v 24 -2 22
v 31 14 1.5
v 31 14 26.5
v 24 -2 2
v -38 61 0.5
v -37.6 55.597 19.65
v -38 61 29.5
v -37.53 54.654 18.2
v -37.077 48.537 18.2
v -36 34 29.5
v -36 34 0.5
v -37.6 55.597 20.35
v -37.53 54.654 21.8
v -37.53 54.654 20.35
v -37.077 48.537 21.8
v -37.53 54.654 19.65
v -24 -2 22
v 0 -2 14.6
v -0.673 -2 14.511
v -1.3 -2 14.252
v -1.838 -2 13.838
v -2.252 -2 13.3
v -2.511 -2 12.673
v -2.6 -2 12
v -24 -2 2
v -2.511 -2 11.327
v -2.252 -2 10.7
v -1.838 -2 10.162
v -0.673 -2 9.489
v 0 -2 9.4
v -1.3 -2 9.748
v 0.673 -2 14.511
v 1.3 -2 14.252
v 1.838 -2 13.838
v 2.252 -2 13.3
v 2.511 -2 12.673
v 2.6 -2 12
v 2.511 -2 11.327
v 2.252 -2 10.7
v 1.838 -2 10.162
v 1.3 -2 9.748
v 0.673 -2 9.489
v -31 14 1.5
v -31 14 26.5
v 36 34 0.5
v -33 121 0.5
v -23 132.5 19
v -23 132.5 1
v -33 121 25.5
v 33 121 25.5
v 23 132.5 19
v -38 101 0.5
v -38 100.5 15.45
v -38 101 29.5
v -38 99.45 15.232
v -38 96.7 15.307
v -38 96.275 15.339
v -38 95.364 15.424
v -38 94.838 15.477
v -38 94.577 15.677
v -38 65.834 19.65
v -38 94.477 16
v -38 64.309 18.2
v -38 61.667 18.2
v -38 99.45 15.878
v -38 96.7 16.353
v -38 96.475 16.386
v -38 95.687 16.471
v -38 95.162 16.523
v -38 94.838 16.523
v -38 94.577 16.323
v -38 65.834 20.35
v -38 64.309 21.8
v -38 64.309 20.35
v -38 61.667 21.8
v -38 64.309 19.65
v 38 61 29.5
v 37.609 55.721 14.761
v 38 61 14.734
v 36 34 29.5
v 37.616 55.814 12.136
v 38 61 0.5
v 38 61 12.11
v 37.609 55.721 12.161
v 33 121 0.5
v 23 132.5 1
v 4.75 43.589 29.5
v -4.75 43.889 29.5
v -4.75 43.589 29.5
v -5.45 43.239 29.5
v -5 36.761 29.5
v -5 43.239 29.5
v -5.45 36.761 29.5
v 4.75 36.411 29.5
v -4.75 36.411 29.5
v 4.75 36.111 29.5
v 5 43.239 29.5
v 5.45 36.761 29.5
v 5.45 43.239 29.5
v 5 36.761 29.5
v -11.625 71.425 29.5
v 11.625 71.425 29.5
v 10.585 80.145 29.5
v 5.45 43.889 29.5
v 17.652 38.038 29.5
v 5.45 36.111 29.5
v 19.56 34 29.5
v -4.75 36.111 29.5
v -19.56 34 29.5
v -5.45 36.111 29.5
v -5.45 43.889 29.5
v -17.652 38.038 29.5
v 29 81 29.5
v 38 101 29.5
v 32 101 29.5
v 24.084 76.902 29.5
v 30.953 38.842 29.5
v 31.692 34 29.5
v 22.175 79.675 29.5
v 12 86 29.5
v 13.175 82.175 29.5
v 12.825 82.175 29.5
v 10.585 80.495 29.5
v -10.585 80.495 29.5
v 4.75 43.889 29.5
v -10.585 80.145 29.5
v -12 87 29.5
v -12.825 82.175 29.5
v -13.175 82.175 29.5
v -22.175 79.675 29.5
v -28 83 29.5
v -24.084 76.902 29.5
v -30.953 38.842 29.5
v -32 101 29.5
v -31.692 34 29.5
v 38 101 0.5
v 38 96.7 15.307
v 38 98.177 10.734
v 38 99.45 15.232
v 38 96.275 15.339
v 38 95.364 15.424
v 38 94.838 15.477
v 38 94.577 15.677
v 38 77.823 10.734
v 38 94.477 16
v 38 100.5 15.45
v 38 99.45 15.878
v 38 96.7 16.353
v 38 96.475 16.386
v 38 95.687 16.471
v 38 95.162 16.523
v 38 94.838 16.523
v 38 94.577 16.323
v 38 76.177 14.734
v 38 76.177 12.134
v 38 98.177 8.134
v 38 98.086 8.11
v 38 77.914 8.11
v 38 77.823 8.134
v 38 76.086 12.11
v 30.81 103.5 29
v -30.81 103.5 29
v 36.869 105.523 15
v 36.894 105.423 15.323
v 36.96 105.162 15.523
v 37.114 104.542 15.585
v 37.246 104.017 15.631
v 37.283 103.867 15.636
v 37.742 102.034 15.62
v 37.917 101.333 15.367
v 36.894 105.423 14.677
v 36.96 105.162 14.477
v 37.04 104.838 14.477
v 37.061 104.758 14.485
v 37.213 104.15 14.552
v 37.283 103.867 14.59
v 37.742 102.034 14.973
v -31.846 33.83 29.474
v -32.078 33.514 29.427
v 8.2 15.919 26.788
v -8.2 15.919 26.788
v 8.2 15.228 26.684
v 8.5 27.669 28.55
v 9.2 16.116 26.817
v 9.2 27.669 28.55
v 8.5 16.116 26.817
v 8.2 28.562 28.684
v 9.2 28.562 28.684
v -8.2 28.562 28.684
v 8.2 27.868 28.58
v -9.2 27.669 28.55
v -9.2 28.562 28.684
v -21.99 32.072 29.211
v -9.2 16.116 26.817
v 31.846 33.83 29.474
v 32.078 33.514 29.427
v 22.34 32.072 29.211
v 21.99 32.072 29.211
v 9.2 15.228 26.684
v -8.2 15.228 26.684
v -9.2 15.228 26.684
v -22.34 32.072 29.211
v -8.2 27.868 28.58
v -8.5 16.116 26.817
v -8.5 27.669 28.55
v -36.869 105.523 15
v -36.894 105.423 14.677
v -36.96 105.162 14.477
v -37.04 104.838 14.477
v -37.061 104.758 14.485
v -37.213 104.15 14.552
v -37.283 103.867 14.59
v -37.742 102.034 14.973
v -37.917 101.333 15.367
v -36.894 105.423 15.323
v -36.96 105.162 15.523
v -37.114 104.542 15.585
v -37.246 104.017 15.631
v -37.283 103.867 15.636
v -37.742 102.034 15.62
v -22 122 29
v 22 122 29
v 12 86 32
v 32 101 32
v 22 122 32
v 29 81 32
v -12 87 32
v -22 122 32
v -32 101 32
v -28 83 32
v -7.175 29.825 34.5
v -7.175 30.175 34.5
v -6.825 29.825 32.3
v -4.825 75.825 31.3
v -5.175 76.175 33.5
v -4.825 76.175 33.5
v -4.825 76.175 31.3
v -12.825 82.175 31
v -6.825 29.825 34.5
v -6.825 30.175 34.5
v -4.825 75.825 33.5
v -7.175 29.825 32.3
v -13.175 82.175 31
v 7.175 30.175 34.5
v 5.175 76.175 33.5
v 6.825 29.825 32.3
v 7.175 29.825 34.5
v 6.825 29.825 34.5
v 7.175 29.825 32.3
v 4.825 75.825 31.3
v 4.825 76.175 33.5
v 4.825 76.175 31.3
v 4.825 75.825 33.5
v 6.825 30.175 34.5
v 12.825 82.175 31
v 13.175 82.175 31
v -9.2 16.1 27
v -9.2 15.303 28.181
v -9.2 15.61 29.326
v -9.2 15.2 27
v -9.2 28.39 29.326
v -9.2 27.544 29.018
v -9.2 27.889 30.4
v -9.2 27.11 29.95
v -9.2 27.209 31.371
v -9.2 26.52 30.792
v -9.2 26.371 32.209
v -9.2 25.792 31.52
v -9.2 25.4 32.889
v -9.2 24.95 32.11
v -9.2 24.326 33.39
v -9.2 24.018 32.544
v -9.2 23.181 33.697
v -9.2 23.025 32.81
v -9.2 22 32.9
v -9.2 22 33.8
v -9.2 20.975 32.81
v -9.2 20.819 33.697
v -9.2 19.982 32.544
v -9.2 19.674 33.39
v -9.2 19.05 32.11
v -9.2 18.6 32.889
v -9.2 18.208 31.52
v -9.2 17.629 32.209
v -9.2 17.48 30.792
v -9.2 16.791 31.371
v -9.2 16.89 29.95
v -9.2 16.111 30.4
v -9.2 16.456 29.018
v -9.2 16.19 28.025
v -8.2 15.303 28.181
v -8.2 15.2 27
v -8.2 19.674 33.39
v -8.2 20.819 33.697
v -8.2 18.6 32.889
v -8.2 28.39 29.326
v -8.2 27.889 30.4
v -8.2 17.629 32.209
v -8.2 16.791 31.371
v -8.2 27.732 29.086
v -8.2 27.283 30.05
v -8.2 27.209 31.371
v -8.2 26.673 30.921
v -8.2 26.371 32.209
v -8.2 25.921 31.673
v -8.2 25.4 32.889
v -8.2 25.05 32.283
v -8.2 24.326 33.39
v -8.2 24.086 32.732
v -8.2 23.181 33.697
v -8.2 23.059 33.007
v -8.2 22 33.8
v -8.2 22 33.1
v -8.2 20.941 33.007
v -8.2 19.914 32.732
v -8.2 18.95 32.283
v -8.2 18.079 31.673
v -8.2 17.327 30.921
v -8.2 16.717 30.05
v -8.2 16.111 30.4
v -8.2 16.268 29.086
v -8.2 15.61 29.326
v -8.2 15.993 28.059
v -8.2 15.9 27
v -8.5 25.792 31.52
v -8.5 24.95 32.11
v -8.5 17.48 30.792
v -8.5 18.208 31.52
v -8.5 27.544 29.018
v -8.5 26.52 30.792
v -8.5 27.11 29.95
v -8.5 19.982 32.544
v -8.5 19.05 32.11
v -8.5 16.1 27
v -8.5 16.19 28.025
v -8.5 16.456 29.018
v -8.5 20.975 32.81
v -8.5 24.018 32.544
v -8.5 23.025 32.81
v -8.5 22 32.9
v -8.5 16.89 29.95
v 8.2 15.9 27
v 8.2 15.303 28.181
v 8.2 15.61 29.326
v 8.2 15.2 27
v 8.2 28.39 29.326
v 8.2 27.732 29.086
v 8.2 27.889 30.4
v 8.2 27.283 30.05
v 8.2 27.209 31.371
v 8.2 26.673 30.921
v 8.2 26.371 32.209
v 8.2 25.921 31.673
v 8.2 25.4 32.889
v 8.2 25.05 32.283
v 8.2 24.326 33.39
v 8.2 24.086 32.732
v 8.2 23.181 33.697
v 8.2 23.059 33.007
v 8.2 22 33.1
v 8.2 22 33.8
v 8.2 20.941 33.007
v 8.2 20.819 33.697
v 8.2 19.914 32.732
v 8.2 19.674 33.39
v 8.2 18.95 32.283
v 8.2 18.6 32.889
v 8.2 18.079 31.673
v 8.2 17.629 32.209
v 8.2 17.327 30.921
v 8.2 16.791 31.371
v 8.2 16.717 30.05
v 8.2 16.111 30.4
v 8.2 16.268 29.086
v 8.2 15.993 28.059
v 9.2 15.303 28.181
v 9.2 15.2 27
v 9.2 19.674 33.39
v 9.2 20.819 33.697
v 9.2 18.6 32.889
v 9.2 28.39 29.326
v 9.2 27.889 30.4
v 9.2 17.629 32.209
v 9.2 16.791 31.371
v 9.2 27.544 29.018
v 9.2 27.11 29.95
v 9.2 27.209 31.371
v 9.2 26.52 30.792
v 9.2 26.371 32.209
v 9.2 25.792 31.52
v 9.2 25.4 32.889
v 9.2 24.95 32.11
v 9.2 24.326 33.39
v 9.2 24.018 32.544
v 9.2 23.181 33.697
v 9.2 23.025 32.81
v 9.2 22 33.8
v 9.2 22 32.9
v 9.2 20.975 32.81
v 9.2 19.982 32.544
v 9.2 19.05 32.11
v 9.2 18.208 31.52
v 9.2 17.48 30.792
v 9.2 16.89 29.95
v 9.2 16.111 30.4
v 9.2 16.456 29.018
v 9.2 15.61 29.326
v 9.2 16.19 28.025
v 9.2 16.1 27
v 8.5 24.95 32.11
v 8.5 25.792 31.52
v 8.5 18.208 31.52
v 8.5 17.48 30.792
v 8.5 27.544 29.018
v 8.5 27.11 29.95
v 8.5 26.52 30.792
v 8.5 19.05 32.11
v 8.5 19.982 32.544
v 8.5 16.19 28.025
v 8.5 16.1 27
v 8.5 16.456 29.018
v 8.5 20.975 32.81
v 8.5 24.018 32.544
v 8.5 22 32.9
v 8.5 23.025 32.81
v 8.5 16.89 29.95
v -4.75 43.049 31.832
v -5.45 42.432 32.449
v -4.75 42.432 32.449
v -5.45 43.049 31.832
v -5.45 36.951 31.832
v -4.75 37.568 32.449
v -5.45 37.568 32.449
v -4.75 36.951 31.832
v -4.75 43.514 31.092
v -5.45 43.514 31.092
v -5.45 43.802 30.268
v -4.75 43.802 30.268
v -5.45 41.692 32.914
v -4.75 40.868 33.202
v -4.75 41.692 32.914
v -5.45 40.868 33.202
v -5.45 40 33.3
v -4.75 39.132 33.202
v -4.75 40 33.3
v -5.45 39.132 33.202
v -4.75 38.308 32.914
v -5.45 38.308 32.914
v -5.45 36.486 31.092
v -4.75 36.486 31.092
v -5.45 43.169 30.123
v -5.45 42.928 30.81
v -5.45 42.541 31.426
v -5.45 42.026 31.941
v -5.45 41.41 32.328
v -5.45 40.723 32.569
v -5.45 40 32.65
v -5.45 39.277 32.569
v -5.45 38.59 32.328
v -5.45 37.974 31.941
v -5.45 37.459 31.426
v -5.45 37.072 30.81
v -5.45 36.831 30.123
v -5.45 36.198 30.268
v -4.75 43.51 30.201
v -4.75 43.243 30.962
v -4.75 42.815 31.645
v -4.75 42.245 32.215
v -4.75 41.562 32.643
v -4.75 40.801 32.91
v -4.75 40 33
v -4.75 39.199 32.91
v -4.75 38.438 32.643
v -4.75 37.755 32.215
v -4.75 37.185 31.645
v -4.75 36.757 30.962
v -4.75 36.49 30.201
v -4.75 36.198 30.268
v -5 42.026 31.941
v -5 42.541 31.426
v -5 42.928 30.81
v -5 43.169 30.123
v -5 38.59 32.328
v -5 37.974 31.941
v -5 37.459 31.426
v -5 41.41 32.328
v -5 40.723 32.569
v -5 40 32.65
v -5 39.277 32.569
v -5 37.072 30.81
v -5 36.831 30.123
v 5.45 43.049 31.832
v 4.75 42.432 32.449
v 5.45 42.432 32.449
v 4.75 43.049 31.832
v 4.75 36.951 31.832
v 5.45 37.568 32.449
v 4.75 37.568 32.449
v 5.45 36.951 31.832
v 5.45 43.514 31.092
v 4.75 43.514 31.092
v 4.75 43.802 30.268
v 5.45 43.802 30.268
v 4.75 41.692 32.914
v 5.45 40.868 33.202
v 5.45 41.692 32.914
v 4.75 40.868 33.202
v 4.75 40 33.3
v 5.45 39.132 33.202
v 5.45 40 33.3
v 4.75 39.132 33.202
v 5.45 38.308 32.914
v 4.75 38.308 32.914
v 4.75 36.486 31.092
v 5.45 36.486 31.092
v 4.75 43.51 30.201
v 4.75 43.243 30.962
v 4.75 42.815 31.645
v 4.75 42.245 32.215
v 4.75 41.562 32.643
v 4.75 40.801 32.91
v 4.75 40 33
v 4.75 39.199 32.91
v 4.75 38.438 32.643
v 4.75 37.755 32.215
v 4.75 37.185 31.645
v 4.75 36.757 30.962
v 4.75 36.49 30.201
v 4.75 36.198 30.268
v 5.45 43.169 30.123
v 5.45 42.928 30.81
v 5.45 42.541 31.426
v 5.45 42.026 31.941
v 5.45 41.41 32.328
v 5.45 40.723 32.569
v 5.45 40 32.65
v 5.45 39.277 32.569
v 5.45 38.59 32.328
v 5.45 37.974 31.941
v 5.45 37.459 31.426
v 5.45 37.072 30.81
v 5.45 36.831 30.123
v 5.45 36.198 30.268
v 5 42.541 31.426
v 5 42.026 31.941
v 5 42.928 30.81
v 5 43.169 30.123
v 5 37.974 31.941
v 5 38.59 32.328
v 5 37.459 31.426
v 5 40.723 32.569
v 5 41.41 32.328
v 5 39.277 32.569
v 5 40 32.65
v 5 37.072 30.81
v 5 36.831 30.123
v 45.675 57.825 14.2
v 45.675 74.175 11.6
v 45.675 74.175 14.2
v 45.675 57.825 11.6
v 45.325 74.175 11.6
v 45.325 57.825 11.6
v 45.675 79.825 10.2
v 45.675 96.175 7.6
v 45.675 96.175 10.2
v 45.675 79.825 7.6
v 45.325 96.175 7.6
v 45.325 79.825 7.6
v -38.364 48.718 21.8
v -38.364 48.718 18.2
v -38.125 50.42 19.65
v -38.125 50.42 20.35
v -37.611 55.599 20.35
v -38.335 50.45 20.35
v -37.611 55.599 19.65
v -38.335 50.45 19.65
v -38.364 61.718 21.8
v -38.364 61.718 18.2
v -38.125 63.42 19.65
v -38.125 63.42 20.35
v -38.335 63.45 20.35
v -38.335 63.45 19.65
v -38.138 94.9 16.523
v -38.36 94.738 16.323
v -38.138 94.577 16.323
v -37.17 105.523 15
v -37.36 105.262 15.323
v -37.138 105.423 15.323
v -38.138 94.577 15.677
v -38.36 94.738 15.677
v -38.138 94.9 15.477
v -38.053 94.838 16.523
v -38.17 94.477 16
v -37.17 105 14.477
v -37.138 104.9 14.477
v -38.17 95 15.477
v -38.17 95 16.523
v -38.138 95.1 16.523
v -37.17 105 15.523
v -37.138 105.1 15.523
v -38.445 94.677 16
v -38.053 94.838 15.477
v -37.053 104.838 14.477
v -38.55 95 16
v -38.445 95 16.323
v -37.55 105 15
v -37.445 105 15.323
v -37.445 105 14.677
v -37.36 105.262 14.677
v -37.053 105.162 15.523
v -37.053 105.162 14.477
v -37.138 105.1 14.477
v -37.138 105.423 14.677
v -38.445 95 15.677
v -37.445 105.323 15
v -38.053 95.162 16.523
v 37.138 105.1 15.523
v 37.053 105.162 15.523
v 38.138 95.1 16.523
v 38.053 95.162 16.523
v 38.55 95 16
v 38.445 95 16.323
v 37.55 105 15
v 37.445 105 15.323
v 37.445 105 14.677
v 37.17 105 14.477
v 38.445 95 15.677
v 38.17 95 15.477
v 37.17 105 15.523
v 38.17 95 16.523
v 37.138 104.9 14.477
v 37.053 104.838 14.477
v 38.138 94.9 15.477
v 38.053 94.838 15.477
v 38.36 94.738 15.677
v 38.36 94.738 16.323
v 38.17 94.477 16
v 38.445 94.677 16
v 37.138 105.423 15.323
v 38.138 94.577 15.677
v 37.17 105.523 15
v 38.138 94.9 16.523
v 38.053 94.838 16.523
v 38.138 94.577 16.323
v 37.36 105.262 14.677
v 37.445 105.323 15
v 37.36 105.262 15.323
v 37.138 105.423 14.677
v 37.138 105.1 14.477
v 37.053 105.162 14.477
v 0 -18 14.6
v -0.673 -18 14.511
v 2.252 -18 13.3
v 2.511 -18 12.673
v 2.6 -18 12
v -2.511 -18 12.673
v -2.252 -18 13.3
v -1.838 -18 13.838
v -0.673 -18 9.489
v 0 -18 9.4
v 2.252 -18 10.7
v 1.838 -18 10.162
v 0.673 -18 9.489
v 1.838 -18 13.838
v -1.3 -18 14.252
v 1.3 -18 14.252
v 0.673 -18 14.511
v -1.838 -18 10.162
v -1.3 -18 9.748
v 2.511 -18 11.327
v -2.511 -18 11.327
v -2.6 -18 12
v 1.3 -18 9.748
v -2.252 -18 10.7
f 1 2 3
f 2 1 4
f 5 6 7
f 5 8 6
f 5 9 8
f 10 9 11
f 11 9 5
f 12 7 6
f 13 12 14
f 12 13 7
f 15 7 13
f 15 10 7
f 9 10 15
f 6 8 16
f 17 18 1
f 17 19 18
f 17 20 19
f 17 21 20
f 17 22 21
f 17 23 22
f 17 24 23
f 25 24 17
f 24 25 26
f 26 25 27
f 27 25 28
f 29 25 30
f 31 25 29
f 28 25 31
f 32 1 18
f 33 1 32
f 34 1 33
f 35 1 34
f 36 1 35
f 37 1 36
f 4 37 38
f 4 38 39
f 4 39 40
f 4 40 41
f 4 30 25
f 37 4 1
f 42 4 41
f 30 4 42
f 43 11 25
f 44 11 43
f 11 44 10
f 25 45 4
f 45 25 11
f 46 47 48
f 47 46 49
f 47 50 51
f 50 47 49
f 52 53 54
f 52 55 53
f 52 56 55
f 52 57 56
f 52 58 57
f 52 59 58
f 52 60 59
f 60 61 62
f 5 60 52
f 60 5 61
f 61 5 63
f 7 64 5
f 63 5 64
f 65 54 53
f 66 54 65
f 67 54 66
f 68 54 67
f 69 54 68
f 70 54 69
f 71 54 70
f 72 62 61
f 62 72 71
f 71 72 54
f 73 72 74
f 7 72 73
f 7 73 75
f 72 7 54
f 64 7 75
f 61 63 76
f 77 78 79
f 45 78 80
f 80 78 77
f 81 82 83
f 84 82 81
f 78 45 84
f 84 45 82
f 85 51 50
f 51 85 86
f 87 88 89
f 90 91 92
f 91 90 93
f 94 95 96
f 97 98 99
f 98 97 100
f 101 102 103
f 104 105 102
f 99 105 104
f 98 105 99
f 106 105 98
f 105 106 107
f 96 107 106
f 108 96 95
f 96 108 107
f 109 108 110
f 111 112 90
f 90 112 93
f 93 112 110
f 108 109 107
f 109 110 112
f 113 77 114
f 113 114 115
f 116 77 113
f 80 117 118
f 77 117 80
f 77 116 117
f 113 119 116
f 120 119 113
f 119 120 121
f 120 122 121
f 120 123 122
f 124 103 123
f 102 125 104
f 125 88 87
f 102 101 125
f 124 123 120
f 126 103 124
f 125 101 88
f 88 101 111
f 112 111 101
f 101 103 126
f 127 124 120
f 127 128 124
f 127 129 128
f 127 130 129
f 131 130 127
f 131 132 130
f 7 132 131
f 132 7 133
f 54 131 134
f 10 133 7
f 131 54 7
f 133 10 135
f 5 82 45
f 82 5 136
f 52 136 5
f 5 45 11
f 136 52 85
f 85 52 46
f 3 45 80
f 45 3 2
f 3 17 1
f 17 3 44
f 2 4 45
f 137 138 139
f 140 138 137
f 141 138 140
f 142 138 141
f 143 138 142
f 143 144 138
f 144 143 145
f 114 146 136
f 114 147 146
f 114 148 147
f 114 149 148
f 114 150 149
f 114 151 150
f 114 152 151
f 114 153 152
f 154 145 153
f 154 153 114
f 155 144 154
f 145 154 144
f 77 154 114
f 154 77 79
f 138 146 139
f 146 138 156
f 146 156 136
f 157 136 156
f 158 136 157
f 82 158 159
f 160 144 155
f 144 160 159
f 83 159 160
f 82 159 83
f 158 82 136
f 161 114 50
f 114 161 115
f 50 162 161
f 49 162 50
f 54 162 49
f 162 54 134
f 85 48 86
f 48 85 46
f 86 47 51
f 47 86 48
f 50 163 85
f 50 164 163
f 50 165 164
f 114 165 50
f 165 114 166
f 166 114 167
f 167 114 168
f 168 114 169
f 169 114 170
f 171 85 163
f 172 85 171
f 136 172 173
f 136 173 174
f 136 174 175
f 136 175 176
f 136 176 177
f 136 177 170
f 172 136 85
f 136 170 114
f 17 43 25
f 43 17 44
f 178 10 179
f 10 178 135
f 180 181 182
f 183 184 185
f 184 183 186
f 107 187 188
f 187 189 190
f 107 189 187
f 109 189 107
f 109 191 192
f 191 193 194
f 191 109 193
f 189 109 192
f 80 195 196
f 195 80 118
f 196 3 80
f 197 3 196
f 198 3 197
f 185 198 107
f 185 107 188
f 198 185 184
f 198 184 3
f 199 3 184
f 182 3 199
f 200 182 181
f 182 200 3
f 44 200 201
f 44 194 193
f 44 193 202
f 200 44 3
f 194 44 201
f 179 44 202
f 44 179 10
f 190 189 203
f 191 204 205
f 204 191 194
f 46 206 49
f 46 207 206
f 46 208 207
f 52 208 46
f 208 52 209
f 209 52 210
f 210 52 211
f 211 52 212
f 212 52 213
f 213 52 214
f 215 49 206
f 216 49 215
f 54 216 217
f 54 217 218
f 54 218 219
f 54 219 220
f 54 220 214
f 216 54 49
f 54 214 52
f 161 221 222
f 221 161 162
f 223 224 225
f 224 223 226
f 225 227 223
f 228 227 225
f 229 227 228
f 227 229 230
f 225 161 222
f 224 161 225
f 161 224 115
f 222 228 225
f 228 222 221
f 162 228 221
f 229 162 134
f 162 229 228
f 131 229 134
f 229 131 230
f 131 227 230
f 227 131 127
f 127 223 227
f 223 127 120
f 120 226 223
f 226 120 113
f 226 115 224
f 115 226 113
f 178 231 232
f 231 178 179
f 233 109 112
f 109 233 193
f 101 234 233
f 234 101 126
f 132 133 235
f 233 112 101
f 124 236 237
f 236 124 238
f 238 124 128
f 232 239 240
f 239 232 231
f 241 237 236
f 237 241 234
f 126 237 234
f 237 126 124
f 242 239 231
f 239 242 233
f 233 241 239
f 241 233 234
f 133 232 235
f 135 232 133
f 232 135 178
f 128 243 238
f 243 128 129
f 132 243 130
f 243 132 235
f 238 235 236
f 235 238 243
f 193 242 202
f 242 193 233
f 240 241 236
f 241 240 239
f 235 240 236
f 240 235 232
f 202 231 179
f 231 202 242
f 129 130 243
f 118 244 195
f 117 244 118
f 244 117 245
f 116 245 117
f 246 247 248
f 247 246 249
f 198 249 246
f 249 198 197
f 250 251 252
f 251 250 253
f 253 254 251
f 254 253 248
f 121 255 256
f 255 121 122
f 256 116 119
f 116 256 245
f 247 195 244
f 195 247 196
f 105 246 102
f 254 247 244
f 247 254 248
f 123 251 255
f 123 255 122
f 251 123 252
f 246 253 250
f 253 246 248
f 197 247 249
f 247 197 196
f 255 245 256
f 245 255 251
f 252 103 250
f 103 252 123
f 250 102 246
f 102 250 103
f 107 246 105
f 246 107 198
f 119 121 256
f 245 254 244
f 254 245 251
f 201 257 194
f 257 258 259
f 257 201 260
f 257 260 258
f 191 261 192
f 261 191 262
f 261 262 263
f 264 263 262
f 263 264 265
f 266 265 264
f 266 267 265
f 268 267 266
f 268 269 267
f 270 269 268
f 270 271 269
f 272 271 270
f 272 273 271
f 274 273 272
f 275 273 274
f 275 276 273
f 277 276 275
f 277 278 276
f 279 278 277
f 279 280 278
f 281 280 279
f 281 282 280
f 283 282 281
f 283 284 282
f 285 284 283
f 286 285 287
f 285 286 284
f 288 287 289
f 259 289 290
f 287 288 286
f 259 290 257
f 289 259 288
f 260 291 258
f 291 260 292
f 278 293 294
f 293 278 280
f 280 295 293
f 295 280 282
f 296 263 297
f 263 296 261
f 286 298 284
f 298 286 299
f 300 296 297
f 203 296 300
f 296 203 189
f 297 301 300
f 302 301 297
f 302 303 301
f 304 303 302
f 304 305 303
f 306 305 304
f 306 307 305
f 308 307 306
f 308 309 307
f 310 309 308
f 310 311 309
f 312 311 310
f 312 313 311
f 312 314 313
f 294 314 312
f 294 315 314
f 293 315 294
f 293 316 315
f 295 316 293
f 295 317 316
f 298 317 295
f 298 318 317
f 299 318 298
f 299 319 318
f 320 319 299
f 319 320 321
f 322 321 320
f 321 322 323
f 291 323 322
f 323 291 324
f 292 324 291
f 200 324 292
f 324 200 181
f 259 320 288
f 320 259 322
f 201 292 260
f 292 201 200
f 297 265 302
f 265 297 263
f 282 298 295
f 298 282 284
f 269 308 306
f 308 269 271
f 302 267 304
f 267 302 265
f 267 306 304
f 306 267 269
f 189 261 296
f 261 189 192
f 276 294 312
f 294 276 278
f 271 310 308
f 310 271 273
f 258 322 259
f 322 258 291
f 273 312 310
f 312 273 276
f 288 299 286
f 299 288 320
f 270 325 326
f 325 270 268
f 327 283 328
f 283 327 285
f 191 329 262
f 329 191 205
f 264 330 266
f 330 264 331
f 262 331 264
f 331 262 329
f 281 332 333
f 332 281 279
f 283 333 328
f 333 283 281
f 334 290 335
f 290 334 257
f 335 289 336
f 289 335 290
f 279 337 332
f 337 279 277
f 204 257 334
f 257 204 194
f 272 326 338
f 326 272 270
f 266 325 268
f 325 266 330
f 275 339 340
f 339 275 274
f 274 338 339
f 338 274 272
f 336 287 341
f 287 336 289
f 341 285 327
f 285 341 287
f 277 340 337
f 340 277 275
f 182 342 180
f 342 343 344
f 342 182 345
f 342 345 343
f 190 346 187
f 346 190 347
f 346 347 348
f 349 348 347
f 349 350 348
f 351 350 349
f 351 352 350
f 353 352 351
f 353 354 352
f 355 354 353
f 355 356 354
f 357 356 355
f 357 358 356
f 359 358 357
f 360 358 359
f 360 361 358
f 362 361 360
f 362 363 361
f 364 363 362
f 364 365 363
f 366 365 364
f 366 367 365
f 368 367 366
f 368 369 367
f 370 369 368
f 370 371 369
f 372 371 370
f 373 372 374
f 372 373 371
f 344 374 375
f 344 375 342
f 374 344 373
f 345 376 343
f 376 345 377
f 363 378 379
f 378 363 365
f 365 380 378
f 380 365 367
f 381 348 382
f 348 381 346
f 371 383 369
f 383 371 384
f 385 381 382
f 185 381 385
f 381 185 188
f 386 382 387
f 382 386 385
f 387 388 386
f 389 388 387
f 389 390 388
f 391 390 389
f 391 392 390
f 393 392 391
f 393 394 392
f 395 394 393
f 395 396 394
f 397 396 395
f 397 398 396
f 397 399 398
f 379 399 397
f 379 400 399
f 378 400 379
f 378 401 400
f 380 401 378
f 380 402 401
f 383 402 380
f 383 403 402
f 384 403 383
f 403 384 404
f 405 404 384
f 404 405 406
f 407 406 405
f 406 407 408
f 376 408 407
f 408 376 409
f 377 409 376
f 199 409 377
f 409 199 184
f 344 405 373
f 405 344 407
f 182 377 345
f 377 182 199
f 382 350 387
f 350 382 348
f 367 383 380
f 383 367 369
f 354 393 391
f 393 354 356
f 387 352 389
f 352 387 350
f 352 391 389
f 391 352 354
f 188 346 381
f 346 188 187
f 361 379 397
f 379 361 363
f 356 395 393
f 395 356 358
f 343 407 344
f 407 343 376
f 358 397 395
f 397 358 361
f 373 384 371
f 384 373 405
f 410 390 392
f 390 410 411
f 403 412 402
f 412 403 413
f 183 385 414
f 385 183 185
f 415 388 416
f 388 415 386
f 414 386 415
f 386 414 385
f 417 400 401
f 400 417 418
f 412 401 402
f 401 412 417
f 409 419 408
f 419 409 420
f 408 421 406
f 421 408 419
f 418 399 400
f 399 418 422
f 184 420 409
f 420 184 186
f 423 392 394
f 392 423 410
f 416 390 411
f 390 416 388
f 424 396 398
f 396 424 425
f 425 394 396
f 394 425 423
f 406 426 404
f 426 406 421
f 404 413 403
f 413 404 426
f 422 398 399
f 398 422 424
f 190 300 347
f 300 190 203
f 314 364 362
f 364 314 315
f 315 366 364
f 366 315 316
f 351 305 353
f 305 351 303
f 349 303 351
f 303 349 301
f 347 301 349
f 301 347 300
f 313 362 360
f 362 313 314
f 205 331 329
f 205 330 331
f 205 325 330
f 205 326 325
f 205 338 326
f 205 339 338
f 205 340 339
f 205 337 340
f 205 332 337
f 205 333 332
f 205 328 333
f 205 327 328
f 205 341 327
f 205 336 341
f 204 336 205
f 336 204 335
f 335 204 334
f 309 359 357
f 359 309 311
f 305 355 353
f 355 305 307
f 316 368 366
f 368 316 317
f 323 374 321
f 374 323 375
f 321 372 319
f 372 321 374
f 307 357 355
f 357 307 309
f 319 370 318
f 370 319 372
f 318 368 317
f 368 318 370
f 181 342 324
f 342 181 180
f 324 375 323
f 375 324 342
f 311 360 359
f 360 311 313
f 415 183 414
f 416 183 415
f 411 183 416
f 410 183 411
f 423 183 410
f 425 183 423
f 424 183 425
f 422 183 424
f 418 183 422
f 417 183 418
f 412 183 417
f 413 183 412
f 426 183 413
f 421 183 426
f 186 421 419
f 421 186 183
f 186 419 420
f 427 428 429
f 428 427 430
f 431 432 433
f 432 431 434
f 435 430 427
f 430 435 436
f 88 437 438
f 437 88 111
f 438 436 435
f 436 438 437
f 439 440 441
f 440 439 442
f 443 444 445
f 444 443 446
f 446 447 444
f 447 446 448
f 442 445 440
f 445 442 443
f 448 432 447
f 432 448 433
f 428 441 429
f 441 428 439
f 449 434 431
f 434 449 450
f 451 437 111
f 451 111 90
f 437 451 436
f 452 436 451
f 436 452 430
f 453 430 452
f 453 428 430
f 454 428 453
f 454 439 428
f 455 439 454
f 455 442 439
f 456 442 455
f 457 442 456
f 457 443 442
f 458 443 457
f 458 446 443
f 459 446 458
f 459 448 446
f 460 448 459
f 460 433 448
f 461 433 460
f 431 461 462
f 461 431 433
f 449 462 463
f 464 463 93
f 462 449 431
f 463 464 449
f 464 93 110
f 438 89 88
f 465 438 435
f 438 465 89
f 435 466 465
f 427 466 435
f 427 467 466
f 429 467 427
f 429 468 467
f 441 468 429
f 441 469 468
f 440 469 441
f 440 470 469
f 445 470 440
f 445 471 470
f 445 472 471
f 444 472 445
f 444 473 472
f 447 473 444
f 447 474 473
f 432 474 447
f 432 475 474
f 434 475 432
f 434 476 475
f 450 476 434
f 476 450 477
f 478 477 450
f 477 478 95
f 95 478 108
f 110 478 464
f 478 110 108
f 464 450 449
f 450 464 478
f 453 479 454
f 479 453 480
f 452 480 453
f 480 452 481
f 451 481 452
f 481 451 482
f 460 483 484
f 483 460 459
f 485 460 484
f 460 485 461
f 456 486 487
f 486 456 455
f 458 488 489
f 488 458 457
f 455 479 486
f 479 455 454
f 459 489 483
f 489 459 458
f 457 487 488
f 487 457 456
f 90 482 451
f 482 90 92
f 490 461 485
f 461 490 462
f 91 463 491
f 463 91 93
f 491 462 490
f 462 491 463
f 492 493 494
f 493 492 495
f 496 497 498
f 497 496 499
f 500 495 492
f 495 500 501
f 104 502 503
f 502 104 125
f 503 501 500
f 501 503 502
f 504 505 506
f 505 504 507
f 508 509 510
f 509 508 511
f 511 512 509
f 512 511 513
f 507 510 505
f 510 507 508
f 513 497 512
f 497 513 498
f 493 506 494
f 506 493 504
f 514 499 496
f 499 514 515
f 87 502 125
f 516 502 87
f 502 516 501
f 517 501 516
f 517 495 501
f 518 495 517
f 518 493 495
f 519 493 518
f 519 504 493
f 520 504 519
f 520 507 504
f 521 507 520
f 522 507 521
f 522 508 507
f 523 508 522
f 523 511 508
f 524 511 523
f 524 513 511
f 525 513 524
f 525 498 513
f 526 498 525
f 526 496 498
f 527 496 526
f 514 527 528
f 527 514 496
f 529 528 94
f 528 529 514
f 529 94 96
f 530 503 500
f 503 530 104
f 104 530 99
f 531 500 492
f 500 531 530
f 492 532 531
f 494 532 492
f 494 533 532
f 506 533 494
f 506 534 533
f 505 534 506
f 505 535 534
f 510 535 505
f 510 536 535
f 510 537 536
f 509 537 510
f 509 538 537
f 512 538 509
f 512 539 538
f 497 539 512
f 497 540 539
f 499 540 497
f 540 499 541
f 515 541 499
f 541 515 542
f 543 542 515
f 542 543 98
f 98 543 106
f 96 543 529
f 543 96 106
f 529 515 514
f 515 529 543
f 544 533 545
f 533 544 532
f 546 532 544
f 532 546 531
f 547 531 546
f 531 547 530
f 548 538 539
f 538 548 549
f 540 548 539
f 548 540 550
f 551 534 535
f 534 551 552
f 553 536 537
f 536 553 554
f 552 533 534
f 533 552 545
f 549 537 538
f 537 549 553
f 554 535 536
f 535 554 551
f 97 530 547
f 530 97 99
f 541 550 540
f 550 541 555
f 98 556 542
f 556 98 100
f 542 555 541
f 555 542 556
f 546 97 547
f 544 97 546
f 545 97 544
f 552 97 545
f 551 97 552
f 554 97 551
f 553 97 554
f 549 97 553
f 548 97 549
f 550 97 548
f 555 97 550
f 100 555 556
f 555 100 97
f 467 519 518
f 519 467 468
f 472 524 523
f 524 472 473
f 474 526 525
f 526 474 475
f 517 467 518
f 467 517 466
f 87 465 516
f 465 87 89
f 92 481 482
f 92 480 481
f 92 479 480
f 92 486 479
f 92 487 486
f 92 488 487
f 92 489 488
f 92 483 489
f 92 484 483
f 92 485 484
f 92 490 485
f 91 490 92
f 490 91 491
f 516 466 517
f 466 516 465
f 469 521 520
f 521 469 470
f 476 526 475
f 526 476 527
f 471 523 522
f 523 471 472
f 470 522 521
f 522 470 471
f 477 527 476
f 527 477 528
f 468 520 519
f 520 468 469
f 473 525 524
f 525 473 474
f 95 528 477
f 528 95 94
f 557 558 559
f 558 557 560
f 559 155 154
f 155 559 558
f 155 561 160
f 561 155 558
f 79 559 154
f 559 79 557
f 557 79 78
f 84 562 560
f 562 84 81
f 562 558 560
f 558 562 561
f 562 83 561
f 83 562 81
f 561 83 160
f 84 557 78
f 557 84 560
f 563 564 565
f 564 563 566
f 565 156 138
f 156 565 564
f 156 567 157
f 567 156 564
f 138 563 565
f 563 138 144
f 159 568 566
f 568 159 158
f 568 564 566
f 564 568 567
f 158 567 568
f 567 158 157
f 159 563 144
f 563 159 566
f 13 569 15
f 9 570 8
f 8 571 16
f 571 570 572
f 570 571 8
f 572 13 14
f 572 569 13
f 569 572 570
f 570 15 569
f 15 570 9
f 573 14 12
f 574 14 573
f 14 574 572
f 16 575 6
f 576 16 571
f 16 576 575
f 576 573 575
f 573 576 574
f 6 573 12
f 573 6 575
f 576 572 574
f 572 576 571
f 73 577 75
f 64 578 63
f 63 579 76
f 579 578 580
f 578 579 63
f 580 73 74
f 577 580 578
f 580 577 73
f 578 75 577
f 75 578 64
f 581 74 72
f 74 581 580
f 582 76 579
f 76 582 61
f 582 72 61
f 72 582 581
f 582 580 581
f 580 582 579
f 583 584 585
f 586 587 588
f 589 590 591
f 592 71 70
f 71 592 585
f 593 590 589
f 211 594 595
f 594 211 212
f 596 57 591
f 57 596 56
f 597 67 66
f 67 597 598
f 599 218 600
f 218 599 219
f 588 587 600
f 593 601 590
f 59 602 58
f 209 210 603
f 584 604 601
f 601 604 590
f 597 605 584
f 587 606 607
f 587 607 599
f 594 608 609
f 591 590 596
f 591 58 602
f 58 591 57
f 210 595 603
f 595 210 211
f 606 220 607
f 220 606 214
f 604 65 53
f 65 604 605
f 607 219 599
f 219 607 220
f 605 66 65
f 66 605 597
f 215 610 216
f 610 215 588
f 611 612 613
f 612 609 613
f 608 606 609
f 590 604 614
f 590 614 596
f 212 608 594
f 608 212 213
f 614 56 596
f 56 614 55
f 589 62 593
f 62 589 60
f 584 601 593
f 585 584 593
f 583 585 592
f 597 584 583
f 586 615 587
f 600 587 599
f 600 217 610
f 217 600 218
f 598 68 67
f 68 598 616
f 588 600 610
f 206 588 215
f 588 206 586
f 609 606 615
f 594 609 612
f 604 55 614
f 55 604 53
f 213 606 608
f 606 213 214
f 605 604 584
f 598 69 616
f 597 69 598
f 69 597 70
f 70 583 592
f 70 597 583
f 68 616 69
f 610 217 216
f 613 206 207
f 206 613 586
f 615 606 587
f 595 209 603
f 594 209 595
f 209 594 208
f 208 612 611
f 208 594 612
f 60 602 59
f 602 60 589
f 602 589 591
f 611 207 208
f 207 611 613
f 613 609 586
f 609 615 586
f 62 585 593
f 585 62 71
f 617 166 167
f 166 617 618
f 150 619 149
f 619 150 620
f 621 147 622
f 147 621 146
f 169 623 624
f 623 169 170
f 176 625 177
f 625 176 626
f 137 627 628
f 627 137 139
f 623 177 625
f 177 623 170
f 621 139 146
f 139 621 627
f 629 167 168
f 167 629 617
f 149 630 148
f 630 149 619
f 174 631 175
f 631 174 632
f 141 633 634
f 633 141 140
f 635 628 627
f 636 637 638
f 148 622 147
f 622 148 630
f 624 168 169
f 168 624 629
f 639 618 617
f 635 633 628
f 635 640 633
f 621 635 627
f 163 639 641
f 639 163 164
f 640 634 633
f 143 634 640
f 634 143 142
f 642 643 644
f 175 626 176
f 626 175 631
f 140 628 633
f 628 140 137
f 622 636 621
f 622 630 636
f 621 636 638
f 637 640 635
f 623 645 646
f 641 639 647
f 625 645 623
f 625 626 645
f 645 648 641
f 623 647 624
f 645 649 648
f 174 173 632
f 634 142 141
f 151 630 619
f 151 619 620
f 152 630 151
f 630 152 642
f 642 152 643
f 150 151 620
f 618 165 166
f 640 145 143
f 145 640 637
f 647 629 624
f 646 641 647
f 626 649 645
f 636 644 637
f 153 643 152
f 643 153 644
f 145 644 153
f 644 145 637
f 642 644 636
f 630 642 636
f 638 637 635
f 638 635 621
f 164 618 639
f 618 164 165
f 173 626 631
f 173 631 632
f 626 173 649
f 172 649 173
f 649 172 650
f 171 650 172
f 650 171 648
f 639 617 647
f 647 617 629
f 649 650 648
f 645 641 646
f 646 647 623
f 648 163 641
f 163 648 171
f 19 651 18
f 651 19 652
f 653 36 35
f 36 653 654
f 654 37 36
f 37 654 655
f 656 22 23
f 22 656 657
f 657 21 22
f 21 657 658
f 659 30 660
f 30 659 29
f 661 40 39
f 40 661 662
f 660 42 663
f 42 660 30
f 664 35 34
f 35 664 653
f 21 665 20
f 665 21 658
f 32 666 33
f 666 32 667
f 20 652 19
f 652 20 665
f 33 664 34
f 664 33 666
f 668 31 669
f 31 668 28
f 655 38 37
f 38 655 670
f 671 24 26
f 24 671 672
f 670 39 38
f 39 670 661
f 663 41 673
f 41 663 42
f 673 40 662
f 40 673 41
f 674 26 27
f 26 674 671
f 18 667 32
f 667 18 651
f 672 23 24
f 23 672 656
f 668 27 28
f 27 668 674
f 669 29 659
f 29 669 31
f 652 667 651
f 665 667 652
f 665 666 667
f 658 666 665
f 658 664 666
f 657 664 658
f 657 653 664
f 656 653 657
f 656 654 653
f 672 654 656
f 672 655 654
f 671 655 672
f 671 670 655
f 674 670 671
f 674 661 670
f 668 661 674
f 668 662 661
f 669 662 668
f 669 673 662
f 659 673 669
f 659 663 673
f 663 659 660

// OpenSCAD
/*
 DIY Custom Mouse — ergonomic envelope v0.1
 Status: visual/ergonomic concept model, NOT a manufacturing-ready shell.
 Units: mm. Coordinates: front/cable = y 0; rear/palm = positive y;
 right-hand pinky/ring-finger support = positive x.

 Primary reference: user-provided white angular mouse concept (2026-10-17).
 The shape is intentionally parameterized. Tune after low-cost hand-fit prototypes.
*/

$fn = 40;

// ---- Global envelope ----
body_length = 132;
body_width_max = 76;          // central shell width, excluding the right finger shelves
body_height_max = 34.5;       // current visual envelope height
show_shell = true;
show_buttons = true;
show_wheels = true;
show_cable = true;
show_lighting = true;
show_thumb_buttons = true;
show_right_finger_shelves = true;

// ---- Adjustable ergonomics ----
// The current values are a starting envelope, not a hand-fit guarantee.
scale_x = 1.00;
scale_y = 1.00;
palm_hump_delta = 0;          // raises/lowers the rear palm panel
ring_shelf_z = 15;             // higher forward support for ring finger
pinky_shelf_z = 11;            // separate lower/rear support for pinky
shelf_projection = 11.5;       // nominal projection from right body side
shelf_length = 22;

// ---- Visual palette for OpenSCAD preview only ----
metal = [0.61, 0.67, 0.69];
metal_dark = [0.30, 0.35, 0.37];
metal_edge = [0.55, 0.61, 0.63];
wheel_rubber = [0.72, 0.78, 0.79];
cyan = [0.02, 0.86, 0.93];
button_surface = [0.83, 0.87, 0.88];

module faceted_plate(top_points, thickness=2) {
    // Convex hull of tiny vertical prisms yields a robust faceted plate without
    // non-planar polyhedron faces. It is a visual envelope, not a finished part.
    hull() {
        for (p = top_points)
            translate([p[0], p[1], p[2] - thickness/2])
                cube([0.35, 0.35, thickness], center=true);
    }
}

module core_envelope() {
    // Hull through cross-section-sized blocks creates the faceted elongated body.
    hull() {
        translate([0, 7, 12])   cube([48, 18, 20], center=true);
        translate([0, 28, 14])  cube([62, 28, 25], center=true);
        translate([0, 55, 15])  cube([72, 42, 29], center=true);
        translate([0, 81, 15])  cube([76, 40, 29], center=true);
        translate([0, 105, 13]) cube([66, 32, 25], center=true);
        translate([0, 124, 10]) cube([46, 17, 18], center=true);
    }
}

module palm_crown() {
    // Broad, sharply outlined rear palm panel. Its planar top is deliberate for v0.1;
    // later variants can compare faceted/raised crowns against ergonomic hand-fit shells.
    translate([0,0,29+palm_hump_delta])
        linear_extrude(height=3, convexity=4)
            polygon(points=[
                [-28, 83], [-12, 87], [12, 86], [29, 81],
                [32, 101], [22, 122], [-22, 122], [-32, 101]
            ]);
}

module left_click_panel() {
    faceted_plate([
        [-34, 34, 29], [-7, 30, 34.5], [-5, 76, 33.5],
        [-13, 82, 31], [-31, 77, 28], [-36, 52, 27]
    ], 2.2);
}

module right_click_panel() {
    faceted_plate([
        [ 7, 30, 34.5], [34, 34, 29], [36, 52, 27],
        [31, 77, 28], [13, 82, 31], [5, 76, 33.5]
    ], 2.2);
}

module click_panels() {
    color(button_surface) {
        left_click_panel();
        right_click_panel();
    }
}

module main_scroll_wheel() {
    // Wheel axis runs left-right (X). Contactless angle sensing + active detents are separate internals.
    translate([0, 22, 27]) {
        color(metal_dark)
            rotate([0,90,0]) cylinder(h=17, r=6.1, center=true, $fn=36);
        color(wheel_rubber)
            rotate([0,90,0]) cylinder(h=13.5, r=5.6, center=true, $fn=32);
        color(cyan)
            for (s = [-1,1])
                translate([s*8.7,0,0]) rotate([0,90,0])
                    difference() {
                        cylinder(h=1.0, r=6.8, center=true, $fn=36);
                        cylinder(h=1.3, r=5.9, center=true, $fn=36);
                    }
    }
}

module dpi_wheel() {
    // A small independent wheel replaces the conventional DPI +/- buttons.
    // Its exact reach and height are to be checked with a real-hand mockup.
    translate([0, 40, 29.4]) {
        color(metal_dark)
            rotate([0,90,0]) cylinder(h=10, r=3.6, center=true, $fn=28);
        color(wheel_rubber)
            rotate([0,90,0]) cylinder(h=7.8, r=3.1, center=true, $fn=28);
        color(cyan)
            for (s = [-1,1])
                translate([s*5.1,0,0]) rotate([0,90,0])
                    difference() {
                        cylinder(h=0.7, r=3.9, center=true, $fn=28);
                        cylinder(h=1.0, r=3.25, center=true, $fn=28);
                    }
    }
}

module side_shelf(y0, y1, z_top, side=1, projection=11.5) {
    // Separate polygonal ledge, partially embedded into the shell for a load-bearing interface.
    // Rounded/contact-edge treatment will be a later CAD layer, not a visual assumption.
    inner_x = 34.0;
    outer_x = inner_x + projection;
    pts = [
        [side*inner_x, y0, z_top],
        [side*outer_x, y0+3, z_top-0.8],
        [side*outer_x, y1-3, z_top-0.8],
        [side*inner_x, y1, z_top]
    ];
    color(metal_edge) faceted_plate(pts, 2.6);
}

module right_hand_finger_shelves() {
    // Two independent support steps: forward/higher ring-finger shelf and rear/lower pinky shelf.
    // The gap between them is intentional and may be tuned parametrically.
    side_shelf(55, 55+shelf_length, ring_shelf_z, 1, shelf_projection);
    side_shelf(77, 77+shelf_length, pinky_shelf_z, 1, shelf_projection);
    if (show_lighting) {
        color(cyan) {
            light_segment([40,58,ring_shelf_z-1.0], [40,69,ring_shelf_z-1.0], 0.55);
            light_segment([40,80,pinky_shelf_z-1.0], [40,91,pinky_shelf_z-1.0], 0.55);
        }
    }
}

module thumb_side_buttons() {
    // Two recessed side-button placeholders on the left/thumb side of a right-handed mouse.
    for (yy = [53, 66]) {
        color(metal_dark)
            translate([-36.5, yy, 20]) rotate([0,0,-8])
                cube([2.5, 9, 3.6], center=true);
        if (show_lighting)
            color(cyan)
                translate([-37.8, yy, 20]) rotate([0,0,-8])
                    cube([0.35, 5.2, 0.7], center=true);
    }
}

module light_segment(a, b, r=0.65) {
    hull() {
        translate(a) sphere(r=r, $fn=10);
        translate(b) sphere(r=r, $fn=10);
    }
}

module shell_lighting() {
    // Recessed-line visual guides only. Production light-pipe cross-sections are not yet modeled.
    color(cyan) {
        light_segment([-34,39,28.5], [-35,51,27.5], 0.48);
        light_segment([-35,51,27.5], [-31,69,28.5], 0.48);
        light_segment([34,39,28.5], [35,51,27.5], 0.48);
        light_segment([35,51,27.5], [31,69,28.5], 0.48);
        light_segment([-38,95,16], [-37,105,15], 0.55);
        light_segment([38,95,16], [37,105,15], 0.55);
    }
}

module cable_stub() {
    color([0.18,0.20,0.21])
        translate([0,-7,12]) rotate([90,0,0]) cylinder(h=22, r=2.6, center=true, $fn=24);
}

module mouse_envelope() {
    scale([scale_x * body_width_max/76, scale_y * body_length/132, body_height_max/34.5]) {
        if (show_shell) {
            color(metal) core_envelope();
            color(metal) palm_crown();
        }
        if (show_buttons) click_panels();
        if (show_wheels) {
            main_scroll_wheel();
            dpi_wheel();
        }
        if (show_right_finger_shelves) right_hand_finger_shelves();
        if (show_thumb_buttons) thumb_side_buttons();
        if (show_lighting) shell_lighting();
        if (show_cable) cable_stub();
    }
}

mouse_envelope();
